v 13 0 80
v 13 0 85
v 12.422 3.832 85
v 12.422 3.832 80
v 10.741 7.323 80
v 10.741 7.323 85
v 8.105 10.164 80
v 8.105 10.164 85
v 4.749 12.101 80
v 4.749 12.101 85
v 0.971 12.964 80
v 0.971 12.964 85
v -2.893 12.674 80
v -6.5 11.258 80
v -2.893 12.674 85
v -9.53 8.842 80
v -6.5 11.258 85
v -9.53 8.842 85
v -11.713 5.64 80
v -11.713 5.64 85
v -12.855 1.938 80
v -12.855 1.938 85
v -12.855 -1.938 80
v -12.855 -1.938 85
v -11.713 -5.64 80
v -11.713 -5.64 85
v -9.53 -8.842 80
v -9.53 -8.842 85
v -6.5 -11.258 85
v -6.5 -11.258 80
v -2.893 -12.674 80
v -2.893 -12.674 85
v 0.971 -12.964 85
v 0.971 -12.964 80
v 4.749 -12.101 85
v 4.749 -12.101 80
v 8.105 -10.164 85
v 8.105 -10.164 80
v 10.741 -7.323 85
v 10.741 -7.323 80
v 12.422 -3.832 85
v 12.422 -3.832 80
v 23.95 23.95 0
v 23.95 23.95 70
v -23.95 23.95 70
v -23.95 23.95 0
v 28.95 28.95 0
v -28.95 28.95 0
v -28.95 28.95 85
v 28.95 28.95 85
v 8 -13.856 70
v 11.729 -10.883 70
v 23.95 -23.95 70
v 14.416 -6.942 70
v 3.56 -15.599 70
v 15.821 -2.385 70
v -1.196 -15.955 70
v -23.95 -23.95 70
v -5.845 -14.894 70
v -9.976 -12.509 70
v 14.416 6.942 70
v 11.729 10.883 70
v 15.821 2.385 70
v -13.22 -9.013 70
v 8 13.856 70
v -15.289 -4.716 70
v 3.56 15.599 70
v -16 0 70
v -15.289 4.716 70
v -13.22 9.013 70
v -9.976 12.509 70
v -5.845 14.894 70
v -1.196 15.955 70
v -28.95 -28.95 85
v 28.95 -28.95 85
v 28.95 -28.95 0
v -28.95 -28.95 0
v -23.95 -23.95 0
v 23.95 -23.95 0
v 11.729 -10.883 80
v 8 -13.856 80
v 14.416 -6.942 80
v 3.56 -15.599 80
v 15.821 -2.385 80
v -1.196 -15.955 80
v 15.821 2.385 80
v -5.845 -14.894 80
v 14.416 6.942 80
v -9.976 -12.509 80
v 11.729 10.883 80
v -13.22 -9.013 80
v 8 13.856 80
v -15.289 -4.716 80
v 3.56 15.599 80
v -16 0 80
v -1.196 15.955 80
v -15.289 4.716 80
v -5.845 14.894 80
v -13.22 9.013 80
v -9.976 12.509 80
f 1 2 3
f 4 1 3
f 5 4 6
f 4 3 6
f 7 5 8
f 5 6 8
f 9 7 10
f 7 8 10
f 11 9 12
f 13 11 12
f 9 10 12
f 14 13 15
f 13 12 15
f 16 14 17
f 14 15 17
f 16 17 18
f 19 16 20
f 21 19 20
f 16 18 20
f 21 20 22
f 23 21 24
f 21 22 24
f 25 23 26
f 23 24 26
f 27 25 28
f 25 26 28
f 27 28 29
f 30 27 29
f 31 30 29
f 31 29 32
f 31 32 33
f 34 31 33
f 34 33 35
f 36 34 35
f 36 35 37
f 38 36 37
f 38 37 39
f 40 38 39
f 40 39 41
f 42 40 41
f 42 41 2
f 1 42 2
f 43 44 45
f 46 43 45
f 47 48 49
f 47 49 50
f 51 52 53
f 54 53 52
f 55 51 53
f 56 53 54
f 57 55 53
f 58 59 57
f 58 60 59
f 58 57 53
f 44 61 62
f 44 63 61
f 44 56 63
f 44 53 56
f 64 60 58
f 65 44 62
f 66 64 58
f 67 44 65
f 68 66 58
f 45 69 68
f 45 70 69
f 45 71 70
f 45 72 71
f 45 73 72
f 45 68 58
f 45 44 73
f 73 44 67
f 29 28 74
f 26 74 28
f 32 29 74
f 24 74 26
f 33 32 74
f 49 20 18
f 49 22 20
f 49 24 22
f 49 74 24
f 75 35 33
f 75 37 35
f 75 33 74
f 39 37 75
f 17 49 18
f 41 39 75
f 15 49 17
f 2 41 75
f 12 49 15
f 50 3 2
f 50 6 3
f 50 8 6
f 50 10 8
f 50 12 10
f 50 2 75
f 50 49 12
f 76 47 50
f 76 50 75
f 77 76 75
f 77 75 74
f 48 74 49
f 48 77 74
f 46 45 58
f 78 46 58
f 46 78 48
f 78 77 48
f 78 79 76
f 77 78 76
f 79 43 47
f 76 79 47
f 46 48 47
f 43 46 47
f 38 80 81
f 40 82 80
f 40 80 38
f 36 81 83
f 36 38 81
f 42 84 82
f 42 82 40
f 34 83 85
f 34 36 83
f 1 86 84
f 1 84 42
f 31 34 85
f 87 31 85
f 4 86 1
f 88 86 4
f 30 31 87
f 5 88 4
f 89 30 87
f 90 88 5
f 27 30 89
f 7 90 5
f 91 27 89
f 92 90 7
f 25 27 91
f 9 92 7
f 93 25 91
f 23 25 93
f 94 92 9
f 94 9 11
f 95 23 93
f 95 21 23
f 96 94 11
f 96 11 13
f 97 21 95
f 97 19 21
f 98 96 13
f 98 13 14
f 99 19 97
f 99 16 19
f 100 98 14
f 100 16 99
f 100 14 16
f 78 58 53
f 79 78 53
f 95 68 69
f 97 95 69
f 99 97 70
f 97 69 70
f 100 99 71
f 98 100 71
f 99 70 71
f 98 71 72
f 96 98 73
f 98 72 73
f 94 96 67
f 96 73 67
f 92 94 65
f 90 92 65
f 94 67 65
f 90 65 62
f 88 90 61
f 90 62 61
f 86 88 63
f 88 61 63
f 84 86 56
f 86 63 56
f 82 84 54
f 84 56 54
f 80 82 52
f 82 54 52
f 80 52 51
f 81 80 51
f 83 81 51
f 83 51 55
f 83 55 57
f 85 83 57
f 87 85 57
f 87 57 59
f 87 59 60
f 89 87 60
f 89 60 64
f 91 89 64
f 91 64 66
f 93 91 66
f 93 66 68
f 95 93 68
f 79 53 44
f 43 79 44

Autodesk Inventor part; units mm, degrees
ref_plane "YZ Plane" through (0, 0, 0) normal (1, 0, 0) x (0, 1, 0)
ref_plane "XZ Plane" through (0, 0, 0) normal (0, 1, 0) x (-1, 0, 0)
ref_plane "XY Plane" through (0, 0, 0) normal (0, 0, 1) x (1, 0, 0)
sketch "Sketch1" plane through (0, 0, 0) normal (0, 0, 1) x (1, 0, 0)
  line L0 (-23.95, -23.95) -> (23.95, -23.95)
  line L1 (23.95, -23.95) -> (23.95, 23.95)
  line L2 (23.95, 23.95) -> (-23.95, 23.95)
  line L3 (-23.95, 23.95) -> (-23.95, -23.95)
  line L4 (-23.95, -23.95) -> (23.95, 23.95) construction
  line L5 (23.95, -23.95) -> (-23.95, 23.95) construction
  line L6 (28.95, 28.95) -> (28.95, -28.95)
  line L7 (28.95, -28.95) -> (-28.95, -28.95)
  line L8 (-28.95, -28.95) -> (-28.95, 28.95)
  line L9 (-28.95, 28.95) -> (28.95, 28.95)
  point P0 (0, 0)
  dimension "d0" = 47.9
  dimension "d1" = 47.9
  dimension "d2" = 5
extrude "Extrusion1" add sketch "Sketch1" along normal blind 85
sketch "Sketch2" plane through (0, 0, 85) normal (0, 0, 1) x (1, 0, 0)
  line L0 (-23.95, 23.95) -> (23.95, 23.95) projected
  line L1 (-23.95, -23.95) -> (23.95, -23.95)
  line L2 (23.95, -23.95) -> (23.95, 23.95)
  line L3 (23.95, 23.95) -> (-23.95, 23.95)
  line L4 (-23.95, 23.95) -> (-23.95, -23.95)
  line L5 (-23.95, -23.95) -> (23.95, 23.95) construction
  line L6 (23.95, -23.95) -> (-23.95, 23.95) construction
  point P0 (0, 0)
extrude "Extrusion2" add sketch "Sketch2" against normal blind 5
sketch "Sketch3" plane through (0, 0, 85) normal (0, 0, 1) x (1, 0, 0)
  circle A0 centre (0, 0) radius 16
  dimension "d7" = 32
extrude "Extrusion3" cut sketch "Sketch3" along normal blind 8
sketch "Sketch4" plane through (-28.95, -28.95, 0) normal (-1, 0, 0) x (0, 0, 1)
  point P0 (0, 28.95)
sketch "Sketch5" plane through (0, 0, 80) normal (0, 0, -1) x (-1, 0, 0)
  line L0 (23.95, 23.95) -> (-23.95, 23.95) projected
  line L1 (-23.95, 23.95) -> (23.95, 23.95)
  line L2 (23.95, 23.95) -> (23.95, -23.9872)
  line L3 (23.95, -23.9872) -> (-23.95, -23.9872)
  line L4 (-23.95, -23.9872) -> (-23.95, 23.95)
  point P0 (0, 0)
extrude "Extrusion4" add sketch "Sketch5" along normal blind 10
sketch "Sketch6" plane through (0, 0, 70) normal (0, 0, -1) x (-1, 0, 0)
  point P0 (0, 0)
sketch "Sketch7" plane through (0, 0, 70) normal (0, 0, -1) x (-1, 0, 0)
  circle A0 centre (0, 0) radius 16
  dimension "d12" = 32
extrude "Extrusion5" cut sketch "Sketch7" against normal blind 10
sketch "Sketch8" plane through (0, 0, 85) normal (0, 0, 1) x (1, 0, 0)
  circle A0 centre (0, 0) radius 13
  dimension "d15" = 26
extrude "Extrusion6" cut sketch "Sketch8" against normal blind 5
properties part number "banebot soporte"
